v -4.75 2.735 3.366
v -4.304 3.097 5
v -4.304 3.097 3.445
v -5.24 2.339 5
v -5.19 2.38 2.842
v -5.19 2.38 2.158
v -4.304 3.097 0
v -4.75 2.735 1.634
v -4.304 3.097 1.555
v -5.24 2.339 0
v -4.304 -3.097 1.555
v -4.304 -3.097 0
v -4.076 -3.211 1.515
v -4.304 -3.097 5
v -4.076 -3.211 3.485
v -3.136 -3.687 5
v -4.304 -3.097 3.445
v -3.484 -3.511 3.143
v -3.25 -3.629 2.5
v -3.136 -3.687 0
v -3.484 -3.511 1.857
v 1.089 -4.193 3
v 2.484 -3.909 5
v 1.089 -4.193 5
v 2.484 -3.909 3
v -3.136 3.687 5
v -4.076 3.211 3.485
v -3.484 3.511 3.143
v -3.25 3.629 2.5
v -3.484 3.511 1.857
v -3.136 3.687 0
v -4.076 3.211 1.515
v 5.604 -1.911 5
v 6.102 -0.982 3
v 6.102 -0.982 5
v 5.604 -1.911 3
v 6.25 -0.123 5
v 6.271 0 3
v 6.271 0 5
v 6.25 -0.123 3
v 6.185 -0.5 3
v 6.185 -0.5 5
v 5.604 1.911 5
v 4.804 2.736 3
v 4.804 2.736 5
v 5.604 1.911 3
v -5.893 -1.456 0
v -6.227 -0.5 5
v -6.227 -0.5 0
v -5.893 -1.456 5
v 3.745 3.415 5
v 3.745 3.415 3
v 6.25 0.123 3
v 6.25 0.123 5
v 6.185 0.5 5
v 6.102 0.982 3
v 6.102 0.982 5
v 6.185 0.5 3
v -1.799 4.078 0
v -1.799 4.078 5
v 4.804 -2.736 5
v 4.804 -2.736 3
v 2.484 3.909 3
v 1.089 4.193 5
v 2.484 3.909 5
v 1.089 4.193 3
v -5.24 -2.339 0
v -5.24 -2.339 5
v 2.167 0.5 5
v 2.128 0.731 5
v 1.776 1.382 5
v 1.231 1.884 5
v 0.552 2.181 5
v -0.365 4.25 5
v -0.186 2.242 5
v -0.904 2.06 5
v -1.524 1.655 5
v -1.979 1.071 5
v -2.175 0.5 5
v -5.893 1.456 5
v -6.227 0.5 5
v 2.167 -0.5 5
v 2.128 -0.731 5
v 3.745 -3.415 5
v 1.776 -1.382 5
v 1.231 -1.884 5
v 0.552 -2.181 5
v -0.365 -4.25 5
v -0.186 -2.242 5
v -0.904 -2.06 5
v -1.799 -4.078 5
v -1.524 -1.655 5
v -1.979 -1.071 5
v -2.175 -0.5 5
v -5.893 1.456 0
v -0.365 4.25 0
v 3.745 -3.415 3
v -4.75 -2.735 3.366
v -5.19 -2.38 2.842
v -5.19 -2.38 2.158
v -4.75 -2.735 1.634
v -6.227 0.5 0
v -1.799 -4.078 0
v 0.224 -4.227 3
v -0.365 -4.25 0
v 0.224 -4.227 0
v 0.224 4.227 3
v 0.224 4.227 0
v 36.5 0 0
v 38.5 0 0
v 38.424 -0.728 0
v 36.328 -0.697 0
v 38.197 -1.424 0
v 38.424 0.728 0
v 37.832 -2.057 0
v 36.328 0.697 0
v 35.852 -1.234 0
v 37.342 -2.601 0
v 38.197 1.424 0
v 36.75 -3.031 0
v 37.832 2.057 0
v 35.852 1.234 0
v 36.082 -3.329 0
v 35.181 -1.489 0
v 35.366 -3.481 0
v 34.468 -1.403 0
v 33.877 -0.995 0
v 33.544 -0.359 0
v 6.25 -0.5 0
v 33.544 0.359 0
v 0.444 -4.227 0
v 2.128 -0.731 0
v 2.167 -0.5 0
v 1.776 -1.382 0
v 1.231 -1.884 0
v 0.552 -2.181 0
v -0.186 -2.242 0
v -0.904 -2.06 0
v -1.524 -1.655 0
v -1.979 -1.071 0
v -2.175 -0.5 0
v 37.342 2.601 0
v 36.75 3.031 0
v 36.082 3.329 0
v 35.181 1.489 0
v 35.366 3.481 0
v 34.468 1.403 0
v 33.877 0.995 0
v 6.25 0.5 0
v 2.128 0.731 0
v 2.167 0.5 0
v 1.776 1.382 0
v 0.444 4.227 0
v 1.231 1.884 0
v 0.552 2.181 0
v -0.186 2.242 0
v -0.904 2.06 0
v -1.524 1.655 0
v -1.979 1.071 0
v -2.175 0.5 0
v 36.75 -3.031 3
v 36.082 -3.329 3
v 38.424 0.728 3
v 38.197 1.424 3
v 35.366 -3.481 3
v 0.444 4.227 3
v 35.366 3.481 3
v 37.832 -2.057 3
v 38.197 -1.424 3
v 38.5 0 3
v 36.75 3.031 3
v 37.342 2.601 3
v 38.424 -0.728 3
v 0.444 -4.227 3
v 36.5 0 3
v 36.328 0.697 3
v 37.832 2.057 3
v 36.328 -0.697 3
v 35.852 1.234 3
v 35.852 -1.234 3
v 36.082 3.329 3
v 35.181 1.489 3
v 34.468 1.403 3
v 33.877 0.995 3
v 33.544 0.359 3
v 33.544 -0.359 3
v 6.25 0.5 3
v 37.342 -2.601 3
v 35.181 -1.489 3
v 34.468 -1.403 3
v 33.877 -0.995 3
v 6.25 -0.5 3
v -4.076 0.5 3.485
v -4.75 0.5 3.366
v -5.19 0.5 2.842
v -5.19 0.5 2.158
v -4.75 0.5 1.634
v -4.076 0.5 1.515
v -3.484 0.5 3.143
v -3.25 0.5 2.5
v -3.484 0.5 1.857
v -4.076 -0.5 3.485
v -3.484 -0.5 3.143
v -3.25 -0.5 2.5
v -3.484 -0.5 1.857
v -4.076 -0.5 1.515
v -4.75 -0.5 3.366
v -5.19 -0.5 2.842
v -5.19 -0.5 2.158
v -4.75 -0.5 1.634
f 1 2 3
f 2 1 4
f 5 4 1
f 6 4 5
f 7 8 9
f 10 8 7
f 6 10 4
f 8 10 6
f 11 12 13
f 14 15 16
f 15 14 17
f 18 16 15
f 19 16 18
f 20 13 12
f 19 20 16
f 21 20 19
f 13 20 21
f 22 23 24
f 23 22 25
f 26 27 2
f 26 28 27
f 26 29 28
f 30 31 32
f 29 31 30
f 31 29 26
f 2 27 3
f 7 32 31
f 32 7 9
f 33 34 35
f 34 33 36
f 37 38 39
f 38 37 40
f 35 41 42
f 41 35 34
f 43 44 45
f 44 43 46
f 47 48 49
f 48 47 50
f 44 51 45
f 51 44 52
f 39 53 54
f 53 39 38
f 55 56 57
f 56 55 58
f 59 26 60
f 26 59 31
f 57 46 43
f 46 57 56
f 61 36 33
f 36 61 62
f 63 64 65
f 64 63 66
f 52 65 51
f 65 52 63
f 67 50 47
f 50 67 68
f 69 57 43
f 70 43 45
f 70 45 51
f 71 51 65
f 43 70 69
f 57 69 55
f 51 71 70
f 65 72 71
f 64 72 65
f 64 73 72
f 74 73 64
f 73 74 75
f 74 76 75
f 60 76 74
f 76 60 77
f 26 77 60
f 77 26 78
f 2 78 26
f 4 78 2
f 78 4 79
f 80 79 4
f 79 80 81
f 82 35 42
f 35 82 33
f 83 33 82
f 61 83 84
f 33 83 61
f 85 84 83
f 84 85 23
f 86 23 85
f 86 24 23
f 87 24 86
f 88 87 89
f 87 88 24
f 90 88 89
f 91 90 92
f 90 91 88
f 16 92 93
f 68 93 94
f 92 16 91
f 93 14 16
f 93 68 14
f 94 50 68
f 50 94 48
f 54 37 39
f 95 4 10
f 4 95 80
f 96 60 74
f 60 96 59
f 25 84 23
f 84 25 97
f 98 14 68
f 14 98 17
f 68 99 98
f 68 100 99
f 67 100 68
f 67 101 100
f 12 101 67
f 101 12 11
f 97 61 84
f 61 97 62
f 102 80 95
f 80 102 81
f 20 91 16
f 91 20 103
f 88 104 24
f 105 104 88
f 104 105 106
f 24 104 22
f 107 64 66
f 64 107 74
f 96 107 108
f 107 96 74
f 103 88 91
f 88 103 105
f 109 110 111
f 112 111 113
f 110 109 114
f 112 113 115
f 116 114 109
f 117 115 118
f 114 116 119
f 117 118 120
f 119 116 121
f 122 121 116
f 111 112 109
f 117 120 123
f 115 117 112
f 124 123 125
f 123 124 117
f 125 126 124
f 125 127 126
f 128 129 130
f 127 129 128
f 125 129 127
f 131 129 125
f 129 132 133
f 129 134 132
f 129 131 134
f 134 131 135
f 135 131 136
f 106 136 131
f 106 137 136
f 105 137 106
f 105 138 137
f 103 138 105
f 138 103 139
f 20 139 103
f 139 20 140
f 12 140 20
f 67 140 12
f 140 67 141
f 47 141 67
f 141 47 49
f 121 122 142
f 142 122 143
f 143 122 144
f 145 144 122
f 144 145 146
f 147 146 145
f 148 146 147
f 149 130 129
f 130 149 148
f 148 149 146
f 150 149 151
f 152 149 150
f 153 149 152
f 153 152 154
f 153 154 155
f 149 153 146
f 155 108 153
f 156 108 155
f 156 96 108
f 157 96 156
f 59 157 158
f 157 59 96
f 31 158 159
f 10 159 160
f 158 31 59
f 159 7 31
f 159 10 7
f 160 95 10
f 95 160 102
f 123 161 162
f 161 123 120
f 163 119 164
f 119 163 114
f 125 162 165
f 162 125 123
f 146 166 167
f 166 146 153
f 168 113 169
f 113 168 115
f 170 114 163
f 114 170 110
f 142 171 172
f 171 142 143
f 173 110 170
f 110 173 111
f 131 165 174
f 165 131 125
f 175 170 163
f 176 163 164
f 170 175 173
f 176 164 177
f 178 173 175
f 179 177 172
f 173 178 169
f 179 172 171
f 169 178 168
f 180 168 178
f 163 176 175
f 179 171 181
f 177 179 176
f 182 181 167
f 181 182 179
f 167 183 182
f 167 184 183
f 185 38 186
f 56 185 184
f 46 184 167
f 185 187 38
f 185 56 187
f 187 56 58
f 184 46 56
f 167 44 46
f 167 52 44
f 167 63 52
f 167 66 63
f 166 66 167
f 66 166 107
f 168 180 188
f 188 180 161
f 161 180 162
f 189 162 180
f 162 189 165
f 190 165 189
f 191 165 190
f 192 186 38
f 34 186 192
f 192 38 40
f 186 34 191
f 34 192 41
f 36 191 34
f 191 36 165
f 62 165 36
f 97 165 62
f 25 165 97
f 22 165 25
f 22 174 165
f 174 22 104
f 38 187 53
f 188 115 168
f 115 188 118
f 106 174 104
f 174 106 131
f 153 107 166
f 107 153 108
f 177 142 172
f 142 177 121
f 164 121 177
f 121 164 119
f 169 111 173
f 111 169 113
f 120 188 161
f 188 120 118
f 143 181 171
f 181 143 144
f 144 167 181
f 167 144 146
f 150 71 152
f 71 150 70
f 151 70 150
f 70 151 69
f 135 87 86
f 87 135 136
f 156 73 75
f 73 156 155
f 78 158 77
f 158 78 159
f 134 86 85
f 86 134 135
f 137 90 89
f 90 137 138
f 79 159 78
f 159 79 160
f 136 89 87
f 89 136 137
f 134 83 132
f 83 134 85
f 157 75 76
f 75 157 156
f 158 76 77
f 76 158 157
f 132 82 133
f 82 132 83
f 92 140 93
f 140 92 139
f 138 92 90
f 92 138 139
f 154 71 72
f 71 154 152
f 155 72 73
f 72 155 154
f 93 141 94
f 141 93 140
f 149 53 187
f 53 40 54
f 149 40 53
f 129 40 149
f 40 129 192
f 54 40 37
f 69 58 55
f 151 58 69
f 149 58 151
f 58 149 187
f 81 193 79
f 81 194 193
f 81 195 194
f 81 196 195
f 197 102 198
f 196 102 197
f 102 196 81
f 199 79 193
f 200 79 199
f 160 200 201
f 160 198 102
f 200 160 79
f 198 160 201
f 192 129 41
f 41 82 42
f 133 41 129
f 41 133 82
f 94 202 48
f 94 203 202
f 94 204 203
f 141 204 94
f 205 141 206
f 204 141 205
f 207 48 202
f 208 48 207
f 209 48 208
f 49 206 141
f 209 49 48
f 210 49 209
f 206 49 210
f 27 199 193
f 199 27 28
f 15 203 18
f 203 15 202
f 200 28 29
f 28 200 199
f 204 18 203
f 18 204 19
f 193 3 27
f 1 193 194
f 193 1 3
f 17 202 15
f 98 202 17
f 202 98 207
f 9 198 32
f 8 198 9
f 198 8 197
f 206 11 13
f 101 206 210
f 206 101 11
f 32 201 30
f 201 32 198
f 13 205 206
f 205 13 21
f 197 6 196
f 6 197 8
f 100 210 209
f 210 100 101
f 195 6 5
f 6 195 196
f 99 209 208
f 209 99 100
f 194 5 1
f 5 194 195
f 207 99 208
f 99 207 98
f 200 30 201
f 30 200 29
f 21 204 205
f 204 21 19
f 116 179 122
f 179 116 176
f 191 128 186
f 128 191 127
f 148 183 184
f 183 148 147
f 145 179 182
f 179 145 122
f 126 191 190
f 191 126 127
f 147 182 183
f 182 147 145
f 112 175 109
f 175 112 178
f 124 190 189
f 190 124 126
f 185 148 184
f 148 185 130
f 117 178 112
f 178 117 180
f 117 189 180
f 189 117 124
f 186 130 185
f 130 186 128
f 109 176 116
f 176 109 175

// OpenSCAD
$fs=.75;

difference(){
	union() {
		union() {
			union() {
				resize(newsize = [12.5000000000, 8.5000000000, 0]) {
					cylinder(d = 6.2500000000, h = 5);
				}
			}
		}
		hull() {
			cylinder(h = 3, r = 4.2500000000);
			translate(v = [35, 0, 0]) {
				union() {
					cylinder(h = 3, r = 3.5000000000);
				}
			}
		}
		translate(v = [35, 0, 0]) {
			union() {
				cylinder(h = 3, r = 3.5000000000);
			}
		}
	}
	/* Holes Below*/
	union(){
		union(){
			union(){
				cylinder(d = 4.5000000000, h = 5);
			}
			translate(v = [0, 0, 0]) {
				translate(v = [0.0000000000, 0, 2.5000000000]) {
					translate(v = [-6.2500000000, -0.5000000000, -2.5000000000]) {
						cube(size = [12.5000000000, 1, 5]);
					}
				}
			}
		}
		translate(v = [-4.2500000000, 0, 2.5000000000]) {
			rotate(a = [90, 0, 0]) {
				translate(v = [0, 0, -10.0000000000]) {
					cylinder(d = 2, h = 20);
				}
			}
		}
		hull(){
			translate(v = [35, 0, 0]){
				union(){
					cylinder(d = 3, h = 3);
				}
			}
		}
		translate(v = [35, 0, 0]){
			union(){
				cylinder(d = 3, h = 3);
			}
		}
	} /* End Holes */ 
}
/***********************************************
*********      SolidPython code:      **********
************************************************
 
from solid import *
from solid import extensions
from math import *

class Object:
    pass

servo = Object()
servo.shaft = Object()
servo.shaft.d = 4.5
servo.shaft.r = servo.shaft.d/2.
servo.shaft.h = 5
servoShaft = cylinder(d=servo.shaft.d,h=servo.shaft.h)

grip = Object()
grip.rx = servo.shaft.r+4
grip.ry = servo.shaft.r+2

hornGrip = ( cylinder(d=grip.rx, h=servo.shaft.h).resize([grip.rx*2,grip.ry*2,0])
	          - servoShaft.set_hole()
              - cube([2*grip.rx, 1, servo.shaft.h]).align('z-').move(x=0).set_hole()
              - cylinder(d=2,h=20).center().rot(x=90).move(x=-(servo.shaft.r+grip.rx)/2.,z=servo.shaft.h/2.).set_hole()
               )

horn = Object()
horn.height = 3
horn.lenght = 35
horn.end = Object()
horn.end.hole = 3
horn.end.r = horn.end.hole/2.+2
hornEnd = ( cylinder(r=horn.end.r, h = horn.height)
	       - cylinder(d=horn.end.hole, h = horn.height).set_hole()).move(x=horn.lenght)

hornBody = hull(cylinder(r=grip.ry, h=horn.height), hornEnd)

scene = hornGrip + hornBody + hornEnd


scad_render_to_file(scene, 'preview.scad', '$fs=.75;')
 
 
************************************************/
